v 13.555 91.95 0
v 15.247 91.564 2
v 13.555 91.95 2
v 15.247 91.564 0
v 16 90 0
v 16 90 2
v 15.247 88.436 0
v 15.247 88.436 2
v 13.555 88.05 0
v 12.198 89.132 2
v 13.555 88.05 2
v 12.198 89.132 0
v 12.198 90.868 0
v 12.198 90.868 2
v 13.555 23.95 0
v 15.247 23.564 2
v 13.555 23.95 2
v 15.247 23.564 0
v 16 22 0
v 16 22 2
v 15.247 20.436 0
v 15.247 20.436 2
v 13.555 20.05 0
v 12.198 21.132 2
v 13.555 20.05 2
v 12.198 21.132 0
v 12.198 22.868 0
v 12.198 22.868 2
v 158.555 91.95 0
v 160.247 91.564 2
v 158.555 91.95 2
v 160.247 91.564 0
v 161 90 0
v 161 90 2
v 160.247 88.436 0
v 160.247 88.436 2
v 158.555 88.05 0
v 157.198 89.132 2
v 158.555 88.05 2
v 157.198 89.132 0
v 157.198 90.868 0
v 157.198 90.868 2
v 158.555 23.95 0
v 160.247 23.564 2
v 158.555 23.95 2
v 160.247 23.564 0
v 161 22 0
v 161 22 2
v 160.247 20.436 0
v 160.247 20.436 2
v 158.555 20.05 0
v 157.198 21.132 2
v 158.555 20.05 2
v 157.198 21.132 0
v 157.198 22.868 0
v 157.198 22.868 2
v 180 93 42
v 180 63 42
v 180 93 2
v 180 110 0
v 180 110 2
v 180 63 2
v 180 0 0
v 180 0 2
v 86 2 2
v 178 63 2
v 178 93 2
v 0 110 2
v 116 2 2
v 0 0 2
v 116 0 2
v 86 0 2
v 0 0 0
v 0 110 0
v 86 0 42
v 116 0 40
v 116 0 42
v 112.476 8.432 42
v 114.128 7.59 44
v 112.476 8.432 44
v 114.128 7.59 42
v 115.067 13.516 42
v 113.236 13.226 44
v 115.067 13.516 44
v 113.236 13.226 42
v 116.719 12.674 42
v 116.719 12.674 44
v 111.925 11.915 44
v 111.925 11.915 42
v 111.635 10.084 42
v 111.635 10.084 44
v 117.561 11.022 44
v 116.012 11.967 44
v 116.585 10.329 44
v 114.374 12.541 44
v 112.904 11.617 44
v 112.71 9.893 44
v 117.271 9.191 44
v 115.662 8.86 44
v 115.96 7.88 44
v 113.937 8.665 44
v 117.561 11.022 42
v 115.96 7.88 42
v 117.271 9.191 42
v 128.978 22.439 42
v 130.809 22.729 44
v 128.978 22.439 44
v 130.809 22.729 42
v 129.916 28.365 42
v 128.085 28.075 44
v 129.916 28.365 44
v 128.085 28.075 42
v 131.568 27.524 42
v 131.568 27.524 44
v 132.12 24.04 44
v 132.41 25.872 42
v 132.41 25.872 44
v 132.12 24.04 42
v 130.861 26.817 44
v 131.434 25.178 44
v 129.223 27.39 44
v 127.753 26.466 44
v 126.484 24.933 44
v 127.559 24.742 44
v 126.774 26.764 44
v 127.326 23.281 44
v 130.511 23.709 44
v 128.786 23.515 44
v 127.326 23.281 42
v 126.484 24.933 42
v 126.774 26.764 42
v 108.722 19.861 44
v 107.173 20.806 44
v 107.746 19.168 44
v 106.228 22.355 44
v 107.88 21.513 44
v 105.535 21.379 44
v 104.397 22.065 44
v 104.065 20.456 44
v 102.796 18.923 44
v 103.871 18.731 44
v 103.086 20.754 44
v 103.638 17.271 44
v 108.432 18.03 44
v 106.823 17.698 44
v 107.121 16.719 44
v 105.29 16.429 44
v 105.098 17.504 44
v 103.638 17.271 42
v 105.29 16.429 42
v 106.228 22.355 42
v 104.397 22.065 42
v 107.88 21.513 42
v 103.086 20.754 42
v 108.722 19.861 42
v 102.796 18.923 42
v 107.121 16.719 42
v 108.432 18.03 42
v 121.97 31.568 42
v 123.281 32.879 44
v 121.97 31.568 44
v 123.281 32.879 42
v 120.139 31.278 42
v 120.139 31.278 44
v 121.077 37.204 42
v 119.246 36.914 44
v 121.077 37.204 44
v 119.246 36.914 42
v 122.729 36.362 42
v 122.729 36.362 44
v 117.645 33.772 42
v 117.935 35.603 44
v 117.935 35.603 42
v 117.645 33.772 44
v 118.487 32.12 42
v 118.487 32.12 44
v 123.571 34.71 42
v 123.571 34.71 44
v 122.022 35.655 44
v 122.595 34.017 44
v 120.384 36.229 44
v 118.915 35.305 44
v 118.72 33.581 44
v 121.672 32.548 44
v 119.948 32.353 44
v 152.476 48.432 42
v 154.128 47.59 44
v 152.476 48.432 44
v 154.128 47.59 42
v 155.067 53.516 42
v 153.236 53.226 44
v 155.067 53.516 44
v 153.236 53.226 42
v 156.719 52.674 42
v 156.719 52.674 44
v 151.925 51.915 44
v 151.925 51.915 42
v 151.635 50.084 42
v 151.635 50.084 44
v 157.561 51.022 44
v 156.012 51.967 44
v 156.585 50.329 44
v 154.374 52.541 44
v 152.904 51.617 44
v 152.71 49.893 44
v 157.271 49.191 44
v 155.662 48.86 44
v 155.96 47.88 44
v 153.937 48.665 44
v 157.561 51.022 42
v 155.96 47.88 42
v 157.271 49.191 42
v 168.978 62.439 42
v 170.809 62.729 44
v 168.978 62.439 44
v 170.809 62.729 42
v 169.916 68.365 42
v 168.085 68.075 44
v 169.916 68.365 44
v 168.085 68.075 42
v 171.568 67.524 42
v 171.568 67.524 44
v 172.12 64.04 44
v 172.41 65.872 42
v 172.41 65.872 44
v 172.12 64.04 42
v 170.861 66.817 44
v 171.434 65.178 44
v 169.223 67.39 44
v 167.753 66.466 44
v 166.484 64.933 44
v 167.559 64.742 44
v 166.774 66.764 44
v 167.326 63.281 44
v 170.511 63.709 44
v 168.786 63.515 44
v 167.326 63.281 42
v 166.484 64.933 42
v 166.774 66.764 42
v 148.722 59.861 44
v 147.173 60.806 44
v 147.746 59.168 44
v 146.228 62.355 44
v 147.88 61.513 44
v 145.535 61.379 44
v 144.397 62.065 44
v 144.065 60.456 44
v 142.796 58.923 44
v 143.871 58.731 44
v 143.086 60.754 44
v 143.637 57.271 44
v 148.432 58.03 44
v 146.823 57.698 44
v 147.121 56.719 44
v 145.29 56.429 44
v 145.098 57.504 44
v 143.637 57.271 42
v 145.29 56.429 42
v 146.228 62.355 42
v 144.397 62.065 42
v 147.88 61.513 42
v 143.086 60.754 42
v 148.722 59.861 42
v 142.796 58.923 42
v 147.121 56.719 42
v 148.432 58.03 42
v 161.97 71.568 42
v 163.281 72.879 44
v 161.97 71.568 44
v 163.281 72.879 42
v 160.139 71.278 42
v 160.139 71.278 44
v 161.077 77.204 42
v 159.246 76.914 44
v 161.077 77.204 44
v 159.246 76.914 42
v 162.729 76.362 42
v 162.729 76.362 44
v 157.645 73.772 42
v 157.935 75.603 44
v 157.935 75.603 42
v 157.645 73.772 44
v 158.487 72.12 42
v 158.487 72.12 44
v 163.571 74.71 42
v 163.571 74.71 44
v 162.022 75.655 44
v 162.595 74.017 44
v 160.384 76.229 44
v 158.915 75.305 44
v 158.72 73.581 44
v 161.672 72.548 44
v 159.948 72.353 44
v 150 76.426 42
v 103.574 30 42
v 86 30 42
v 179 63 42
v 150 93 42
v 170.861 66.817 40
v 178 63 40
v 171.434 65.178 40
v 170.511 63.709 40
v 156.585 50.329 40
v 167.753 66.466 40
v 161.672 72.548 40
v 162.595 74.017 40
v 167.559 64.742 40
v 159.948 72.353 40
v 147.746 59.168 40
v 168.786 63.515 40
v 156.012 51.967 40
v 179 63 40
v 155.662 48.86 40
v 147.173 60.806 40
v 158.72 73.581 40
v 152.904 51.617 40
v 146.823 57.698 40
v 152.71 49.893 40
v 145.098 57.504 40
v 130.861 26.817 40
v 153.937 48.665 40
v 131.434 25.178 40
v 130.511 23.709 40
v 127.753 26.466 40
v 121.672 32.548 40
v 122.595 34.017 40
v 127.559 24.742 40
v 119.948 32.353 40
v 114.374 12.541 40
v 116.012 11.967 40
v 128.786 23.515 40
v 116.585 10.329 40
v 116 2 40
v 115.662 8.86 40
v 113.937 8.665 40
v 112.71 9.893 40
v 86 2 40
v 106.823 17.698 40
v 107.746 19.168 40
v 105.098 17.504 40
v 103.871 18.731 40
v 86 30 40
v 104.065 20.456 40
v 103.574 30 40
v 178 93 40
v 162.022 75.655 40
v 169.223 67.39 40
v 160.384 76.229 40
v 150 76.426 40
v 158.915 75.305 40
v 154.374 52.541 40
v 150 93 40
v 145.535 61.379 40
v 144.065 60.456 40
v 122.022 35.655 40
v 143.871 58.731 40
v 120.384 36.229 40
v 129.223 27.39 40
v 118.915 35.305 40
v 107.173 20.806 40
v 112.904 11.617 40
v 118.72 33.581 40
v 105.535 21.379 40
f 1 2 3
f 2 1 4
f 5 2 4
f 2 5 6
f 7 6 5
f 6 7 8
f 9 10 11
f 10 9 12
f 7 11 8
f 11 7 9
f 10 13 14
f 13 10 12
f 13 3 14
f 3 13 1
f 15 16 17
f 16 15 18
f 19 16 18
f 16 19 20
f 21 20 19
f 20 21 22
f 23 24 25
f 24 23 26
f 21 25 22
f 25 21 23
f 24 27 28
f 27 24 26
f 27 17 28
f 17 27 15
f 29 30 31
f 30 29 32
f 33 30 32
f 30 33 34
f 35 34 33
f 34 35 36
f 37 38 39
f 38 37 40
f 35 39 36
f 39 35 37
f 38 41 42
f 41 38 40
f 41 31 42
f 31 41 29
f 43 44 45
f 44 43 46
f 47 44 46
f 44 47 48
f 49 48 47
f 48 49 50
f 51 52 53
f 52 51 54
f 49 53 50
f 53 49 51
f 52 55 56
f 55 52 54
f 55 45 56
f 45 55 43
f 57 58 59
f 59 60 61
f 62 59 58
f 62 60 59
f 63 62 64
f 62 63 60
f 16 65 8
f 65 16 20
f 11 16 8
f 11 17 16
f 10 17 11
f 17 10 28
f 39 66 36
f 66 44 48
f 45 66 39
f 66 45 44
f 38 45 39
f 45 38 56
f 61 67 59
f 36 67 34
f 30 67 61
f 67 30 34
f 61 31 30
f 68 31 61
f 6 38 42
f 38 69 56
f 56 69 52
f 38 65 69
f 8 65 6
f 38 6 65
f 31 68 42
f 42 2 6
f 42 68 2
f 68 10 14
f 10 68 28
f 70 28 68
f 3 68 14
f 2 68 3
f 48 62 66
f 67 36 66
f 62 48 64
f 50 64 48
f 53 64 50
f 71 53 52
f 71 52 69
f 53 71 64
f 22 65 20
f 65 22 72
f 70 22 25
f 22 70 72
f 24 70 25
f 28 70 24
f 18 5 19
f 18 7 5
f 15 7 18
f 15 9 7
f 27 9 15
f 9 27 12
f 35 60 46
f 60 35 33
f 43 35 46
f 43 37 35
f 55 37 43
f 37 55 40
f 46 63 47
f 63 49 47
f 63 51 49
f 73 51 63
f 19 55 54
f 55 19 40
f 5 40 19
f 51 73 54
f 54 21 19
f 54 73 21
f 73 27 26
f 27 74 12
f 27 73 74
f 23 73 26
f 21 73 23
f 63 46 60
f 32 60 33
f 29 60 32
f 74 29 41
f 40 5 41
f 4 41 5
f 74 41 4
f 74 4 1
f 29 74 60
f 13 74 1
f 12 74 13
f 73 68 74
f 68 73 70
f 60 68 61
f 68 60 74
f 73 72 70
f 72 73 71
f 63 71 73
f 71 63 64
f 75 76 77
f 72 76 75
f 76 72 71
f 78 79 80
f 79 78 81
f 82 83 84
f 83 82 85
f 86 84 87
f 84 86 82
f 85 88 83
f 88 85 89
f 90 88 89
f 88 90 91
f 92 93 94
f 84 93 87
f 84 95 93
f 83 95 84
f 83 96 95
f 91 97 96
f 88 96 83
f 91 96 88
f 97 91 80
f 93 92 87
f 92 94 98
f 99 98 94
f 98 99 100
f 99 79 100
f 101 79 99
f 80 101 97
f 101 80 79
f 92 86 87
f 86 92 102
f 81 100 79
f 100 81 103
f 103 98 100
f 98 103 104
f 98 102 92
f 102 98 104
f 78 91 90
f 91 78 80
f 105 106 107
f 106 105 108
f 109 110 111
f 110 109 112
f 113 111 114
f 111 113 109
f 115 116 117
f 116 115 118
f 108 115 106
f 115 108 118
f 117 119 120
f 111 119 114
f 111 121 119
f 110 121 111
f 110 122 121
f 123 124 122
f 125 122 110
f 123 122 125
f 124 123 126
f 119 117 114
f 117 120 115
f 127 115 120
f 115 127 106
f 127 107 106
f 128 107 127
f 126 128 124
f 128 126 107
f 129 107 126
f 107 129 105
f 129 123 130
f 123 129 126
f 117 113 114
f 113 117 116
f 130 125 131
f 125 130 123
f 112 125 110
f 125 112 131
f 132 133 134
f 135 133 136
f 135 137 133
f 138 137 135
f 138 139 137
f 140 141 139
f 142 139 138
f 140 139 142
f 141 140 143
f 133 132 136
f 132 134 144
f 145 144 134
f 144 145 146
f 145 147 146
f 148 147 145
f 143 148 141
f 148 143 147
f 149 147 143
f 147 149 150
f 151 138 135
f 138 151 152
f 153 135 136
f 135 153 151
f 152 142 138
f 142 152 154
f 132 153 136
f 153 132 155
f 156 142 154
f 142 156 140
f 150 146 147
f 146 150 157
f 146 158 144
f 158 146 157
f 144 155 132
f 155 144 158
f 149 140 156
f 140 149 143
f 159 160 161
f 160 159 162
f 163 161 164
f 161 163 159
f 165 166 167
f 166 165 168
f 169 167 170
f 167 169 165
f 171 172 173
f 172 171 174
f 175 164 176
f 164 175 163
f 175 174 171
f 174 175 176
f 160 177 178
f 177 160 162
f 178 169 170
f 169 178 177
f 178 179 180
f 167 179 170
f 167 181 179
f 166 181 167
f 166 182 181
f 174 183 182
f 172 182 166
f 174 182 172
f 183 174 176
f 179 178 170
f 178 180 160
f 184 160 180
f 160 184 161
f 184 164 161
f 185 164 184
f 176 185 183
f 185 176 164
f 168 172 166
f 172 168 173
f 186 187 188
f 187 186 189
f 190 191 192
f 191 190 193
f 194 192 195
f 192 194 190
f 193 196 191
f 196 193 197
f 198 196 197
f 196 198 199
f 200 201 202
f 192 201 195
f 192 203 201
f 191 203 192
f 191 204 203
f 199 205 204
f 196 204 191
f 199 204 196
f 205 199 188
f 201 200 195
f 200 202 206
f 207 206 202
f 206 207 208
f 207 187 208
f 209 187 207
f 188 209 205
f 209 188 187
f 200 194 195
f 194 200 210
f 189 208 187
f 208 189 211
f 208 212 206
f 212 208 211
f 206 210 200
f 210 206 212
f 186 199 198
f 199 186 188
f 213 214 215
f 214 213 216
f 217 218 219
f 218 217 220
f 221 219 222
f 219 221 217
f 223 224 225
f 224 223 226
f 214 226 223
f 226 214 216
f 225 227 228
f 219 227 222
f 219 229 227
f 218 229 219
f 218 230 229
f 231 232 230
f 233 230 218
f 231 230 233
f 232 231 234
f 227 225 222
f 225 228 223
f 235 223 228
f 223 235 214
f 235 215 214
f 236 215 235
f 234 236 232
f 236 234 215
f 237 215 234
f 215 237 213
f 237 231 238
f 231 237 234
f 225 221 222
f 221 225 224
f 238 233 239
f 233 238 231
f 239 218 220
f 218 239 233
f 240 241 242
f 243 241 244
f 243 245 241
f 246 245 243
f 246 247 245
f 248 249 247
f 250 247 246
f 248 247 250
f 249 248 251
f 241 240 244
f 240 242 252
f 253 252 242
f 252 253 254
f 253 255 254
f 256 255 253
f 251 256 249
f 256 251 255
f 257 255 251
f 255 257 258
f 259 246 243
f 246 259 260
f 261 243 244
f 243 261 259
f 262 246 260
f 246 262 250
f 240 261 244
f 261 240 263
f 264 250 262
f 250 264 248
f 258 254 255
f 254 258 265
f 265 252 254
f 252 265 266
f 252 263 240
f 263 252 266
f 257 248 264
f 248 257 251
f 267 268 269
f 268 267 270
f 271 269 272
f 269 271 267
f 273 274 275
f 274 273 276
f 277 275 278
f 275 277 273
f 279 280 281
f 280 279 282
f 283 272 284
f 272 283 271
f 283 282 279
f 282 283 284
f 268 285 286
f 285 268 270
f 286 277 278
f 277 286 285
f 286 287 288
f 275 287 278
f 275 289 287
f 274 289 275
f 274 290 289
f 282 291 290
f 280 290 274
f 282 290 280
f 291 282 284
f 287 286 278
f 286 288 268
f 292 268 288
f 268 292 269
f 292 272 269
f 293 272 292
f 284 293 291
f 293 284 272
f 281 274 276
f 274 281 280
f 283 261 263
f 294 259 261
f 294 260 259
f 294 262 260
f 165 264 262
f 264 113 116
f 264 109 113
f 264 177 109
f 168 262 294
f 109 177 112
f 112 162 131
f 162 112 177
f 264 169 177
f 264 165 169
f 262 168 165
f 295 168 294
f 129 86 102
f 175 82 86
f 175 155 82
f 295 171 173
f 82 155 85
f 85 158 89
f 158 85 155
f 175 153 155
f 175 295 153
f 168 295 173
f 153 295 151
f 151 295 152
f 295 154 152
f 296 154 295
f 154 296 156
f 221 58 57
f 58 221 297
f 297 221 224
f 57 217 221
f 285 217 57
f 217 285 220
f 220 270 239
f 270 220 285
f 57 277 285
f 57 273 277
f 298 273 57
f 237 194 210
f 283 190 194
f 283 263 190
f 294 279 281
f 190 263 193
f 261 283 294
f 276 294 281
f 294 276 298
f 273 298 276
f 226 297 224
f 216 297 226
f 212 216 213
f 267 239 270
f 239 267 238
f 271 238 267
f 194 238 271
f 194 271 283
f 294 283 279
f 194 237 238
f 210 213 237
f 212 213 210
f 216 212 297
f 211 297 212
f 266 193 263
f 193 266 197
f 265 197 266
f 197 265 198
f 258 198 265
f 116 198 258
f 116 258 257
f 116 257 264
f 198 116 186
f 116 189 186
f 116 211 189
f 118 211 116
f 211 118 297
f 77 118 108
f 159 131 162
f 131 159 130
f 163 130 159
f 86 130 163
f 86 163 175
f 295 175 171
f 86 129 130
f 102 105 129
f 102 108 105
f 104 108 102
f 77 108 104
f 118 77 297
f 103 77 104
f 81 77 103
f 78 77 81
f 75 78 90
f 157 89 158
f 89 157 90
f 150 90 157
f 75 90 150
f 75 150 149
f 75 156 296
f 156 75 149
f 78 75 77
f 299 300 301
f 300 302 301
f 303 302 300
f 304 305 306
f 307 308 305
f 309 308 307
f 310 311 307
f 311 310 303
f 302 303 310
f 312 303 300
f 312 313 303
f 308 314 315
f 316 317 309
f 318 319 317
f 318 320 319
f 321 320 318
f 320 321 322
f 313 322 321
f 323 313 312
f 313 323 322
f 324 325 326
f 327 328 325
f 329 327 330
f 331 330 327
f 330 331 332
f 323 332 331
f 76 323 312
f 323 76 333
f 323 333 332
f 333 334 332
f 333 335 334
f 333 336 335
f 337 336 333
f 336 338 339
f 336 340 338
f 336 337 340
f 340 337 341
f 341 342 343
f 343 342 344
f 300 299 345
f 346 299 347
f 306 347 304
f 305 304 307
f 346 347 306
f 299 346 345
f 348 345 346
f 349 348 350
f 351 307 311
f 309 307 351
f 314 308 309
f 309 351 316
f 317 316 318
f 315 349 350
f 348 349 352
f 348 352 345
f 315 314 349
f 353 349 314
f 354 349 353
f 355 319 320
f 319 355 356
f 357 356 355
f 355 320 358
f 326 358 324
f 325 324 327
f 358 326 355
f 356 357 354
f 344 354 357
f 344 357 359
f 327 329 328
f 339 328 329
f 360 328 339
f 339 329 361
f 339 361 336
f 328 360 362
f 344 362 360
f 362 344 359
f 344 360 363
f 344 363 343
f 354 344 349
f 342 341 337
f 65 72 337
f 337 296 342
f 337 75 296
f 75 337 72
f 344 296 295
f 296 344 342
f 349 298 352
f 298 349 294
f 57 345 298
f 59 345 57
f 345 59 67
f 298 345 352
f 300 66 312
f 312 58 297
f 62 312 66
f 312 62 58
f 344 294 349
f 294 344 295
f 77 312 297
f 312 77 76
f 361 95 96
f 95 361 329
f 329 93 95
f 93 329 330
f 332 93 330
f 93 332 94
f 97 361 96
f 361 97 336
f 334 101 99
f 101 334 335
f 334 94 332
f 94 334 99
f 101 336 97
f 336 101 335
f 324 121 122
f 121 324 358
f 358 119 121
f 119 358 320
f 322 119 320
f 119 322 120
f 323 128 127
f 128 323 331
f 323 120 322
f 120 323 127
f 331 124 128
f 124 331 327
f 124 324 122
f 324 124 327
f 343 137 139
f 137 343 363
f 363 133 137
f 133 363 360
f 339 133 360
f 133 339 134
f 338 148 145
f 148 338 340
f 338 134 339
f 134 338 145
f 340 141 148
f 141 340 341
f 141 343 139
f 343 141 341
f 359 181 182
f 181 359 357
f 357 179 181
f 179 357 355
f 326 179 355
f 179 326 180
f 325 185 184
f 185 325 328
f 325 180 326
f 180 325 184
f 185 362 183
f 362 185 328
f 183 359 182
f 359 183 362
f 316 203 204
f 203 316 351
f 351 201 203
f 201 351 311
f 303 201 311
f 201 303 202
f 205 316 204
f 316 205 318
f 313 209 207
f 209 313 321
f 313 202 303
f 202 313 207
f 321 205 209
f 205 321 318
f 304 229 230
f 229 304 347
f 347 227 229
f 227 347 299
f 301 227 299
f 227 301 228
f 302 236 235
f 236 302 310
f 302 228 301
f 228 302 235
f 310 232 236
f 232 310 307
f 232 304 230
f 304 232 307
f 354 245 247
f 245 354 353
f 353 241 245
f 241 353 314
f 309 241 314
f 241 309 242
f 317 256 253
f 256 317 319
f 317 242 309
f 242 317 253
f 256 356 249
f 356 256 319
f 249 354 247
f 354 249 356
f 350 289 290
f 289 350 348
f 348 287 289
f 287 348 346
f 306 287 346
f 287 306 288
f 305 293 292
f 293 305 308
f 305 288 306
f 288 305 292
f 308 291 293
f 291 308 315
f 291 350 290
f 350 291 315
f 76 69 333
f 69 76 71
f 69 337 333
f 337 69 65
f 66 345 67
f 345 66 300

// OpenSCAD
// file: helpers.scad
module standoff(x, y, z, h, r){
    translate([x, y, z])
        cylinder(h, r=r);
}


cam_dim = [25, 23.862]; // Camera dimensions
// Camera mounting holes relative to camera center
_cam_mount_bl = [(-cam_dim[0]/2)+2, (-cam_dim[1]/2)+2];
_cam_mount_tl = [(-cam_dim[0]/2)+2, 14.5-(cam_dim[1]/2)];
_cam_mount_br = [(cam_dim[0]/2)-2, (-cam_dim[1]/2)+2];
_cam_mount_tr = [(cam_dim[0]/2)-2, 14.5-(cam_dim[1]/2)];
module camera_standoffs(cam_x, cam_y, z, h, r){
    standoff(
        cam_x + _cam_mount_bl[0], 
        cam_y + _cam_mount_bl[1],
        z,
        h,
        r
    );
    standoff(
        cam_x + _cam_mount_br[0], 
        cam_y + _cam_mount_br[1],
        z,
        h,
        r
    );
    standoff(
        cam_x + _cam_mount_tl[0], 
        cam_y + _cam_mount_tl[1],
        z,
        h,
        r
    );
    standoff(
        cam_x + _cam_mount_tr[0], 
        cam_y + _cam_mount_tr[1],
        z,
        h,
        r
    );
}

module field_of_view(angle_x, angle_y, low, high){
    x = 2 * low * tan(angle_x/2);
    y = 2 * low * tan(angle_y/2);
    s = high / low;
    
    translate([0,0,low]) linear_extrude(
        height=high-low, 
//        v=[0,0,1], 
        center=false,
        scale=s
    ) scale([x,y]) circle(1, $fn=20);
}


cam_sensor = [0, 14.4 - (cam_dim[1]/2)]; // Camera sensor position, relative to camera center

module camera_and_mount(standoff, show_camera=false)
{
    if(show_camera)
    {
        translate([
            -cam_dim[0]/2, 
            -cam_dim[1]/2-cam_sensor[1], 
            standoff
        ])
        rotate([180, 0, 90])
            color("green") import("Camera_module_3_std_model_simple.stl");
    };
    difference()
    {
        camera_standoffs(0, -cam_sensor[1], 0, standoff, 3);
        camera_standoffs(0, -cam_sensor[1], -0.1, standoff+0.2, 1.5);
    };
}


module camera_and_mount_diff(standoff)
{
    camera_standoffs(0, -cam_sensor[1], -50-standoff/2, 100+standoff, 1.5);
    translate([0, 0, standoff+8])    
    field_of_view(
        66, 41,
        0.1, 50
    );
}


overlap = 0.001; // Overlap for joining parts

material_thickness = 3; // Smallest dimension of printed parts
pcb_standoff = 1; // Spacing underneath main PCB
cam_standoff = 3; // Spacing underneath camera PCBs

tof_dim = [22.86, 12.7]; // Time-of-flight sensor breakout dimensions
pcb_dim = [90, 70]; // PCB x-y size
pcb_mount_border = 10; // Material space around PCB
// PCB mounting holes x-y pos relative to PCB origin
pcb_mount_bl = [4.064, 3.556];
pcb_mount_tl = [4.064, pcb_dim[1]-3.5567];
pcb_mount_br = [pcb_dim[0]-4.572, 3.556];
pcb_mount_tr = [pcb_dim[0]-4.472, pcb_dim[1]-3.556];
pcb_mount_d = 2.5; // PCB mount hole diameter


module main_board(standoff, show_electronics=false)
{

    translate([- 33 - pcb_mount_border - tof_dim[0]/2, 
                - tof_dim[1] - 3.302 - pcb_mount_border + tof_dim[1]/2, 
                0]) union() // Shift entire assembly so sensor is at origin in x-y plane
    {
        if(show_electronics)
        {
            // ToF sensor, aligned to holes on carrier PCB, with mounting height of 8.51mm (female header pin insulation) + 2.5mm (male header pin insulation)
            translate([
                33 + pcb_mount_border, 
                tof_dim[1] + 3.302 + pcb_mount_border, 
                8.51 + 2.5 + standoff]
            ) 
            rotate([0, 0, -90])
                color("green") import("vl53l8cx-carrier-model.stl");
           
            
            // PCB model, without RPi (smaller height than    other components, so can ommit)
            translate([
                pcb_mount_border, 
                pcb_mount_border, 
                standoff
            ])
                color("green") import("../cpu_carrier/cpu_carrier.stl");
        };
        
        // Mounting
        difference(){
            union(){
                // Standoffs to provide space under PCB
                standoff(
                    pcb_mount_bl[0] + pcb_mount_border, 
                    pcb_mount_bl[1] + pcb_mount_border, 
                    0,
                    standoff,
                    4
                );
                standoff(
                    pcb_mount_tl[0] + pcb_mount_border, 
                    pcb_mount_tl[1] + pcb_mount_border, 
                    0,
                    standoff,
                    4
                );
                standoff(
                    pcb_mount_br[0] + pcb_mount_border, 
                    pcb_mount_br[1] + pcb_mount_border, 
                    0,
                    standoff,
                    4
                );
                standoff(
                    pcb_mount_tr[0] + pcb_mount_border, 
                    pcb_mount_tr[1] + pcb_mount_border, 
                    0 ,
                    standoff,
                    4
                );
            };
            // Holes
            union(){
                standoff(
                    pcb_mount_bl[0] + pcb_mount_border, 
                    pcb_mount_bl[1] + pcb_mount_border, 
                    -overlap,
                    standoff+2*overlap,
                    1.5
                );
                standoff(
                    pcb_mount_tl[0] + pcb_mount_border, 
                    pcb_mount_tl[1] + pcb_mount_border, 
                    -overlap,
                    standoff+2*overlap,
                    1.5
                );
                standoff(
                    pcb_mount_br[0] + pcb_mount_border, 
                    pcb_mount_br[1] + pcb_mount_border, 
                    -overlap,
                    standoff+2*overlap,
                    1.5
                );
                standoff(
                    pcb_mount_tr[0] + pcb_mount_border, 
                    pcb_mount_tr[1] + pcb_mount_border, 
                    -overlap,
                    standoff+2*overlap,
                    1.5
                );
            }
        };
    };
}


module main_board_diff(standoff)
{

    translate([0, 0, 8.51 + 2.5 + standoff + 3]) field_of_view(
        60, 60,
        0.1, 50
    );
    translate([- 33 - pcb_mount_border - tof_dim[0]/2, 
                - tof_dim[1] - 3.302 - pcb_mount_border + tof_dim[1]/2, 
                0]) 
    union() // Shift entire assembly so sensor is at origin in x-y plane
    {
        standoff(
            pcb_mount_bl[0] + pcb_mount_border, 
            pcb_mount_bl[1] + pcb_mount_border, 
            -50-standoff/2,
            100+standoff,
            1.5
        );
        standoff(
            pcb_mount_tl[0] + pcb_mount_border, 
            pcb_mount_tl[1] + pcb_mount_border, 
            -50-standoff/2,
            100+standoff,
            1.5
        );
        standoff(
            pcb_mount_br[0] + pcb_mount_border, 
            pcb_mount_br[1] + pcb_mount_border, 
            -50-standoff/2,
            100+standoff,
            1.5
        );
        standoff(
            pcb_mount_tr[0] + pcb_mount_border, 
            pcb_mount_tr[1] + pcb_mount_border, 
            -50-standoff/2,
            100+standoff,
            1.5
        );
    };
}
// main file
include <helpers.scad>

// Base and mount holes
difference(){
    cube([180, 110, 2]);
    union(){
        translate([14, 90, -0.5])
            cylinder(3, r=2);
        translate([14, 22, -0.5])
            cylinder(3, r=2);
        translate([159, 90, -0.5])
            cylinder(3, r=2);
        translate([159, 22, -0.5])
            cylinder(3, r=2);
    };
};

// Camera platform
union(){
    difference(){
        union(){
            // Platform
            translate([86, 0, 40]) cube([30, 30, 2]);
            translate([150, 63, 40]) cube([30, 30, 2]);
            translate([116, 0, 40]) rotate([0, 0, 45])
                cube([90, 30, 2]);
            // Camera standoffs
            translate([115, 25, 41]) rotate([0, 0, 45])
                camera_standoffs(0, 0, 0, 3, 3);
            translate([155, 65, 41]) rotate([0, 0, 45])
                camera_standoffs(0, 0, 0, 3, 3);
        };
        union(){
            translate([115, 25, 41]) rotate([0, 0, 45])
            translate([0,0,-3]) camera_standoffs(0, 0, 0, 7, 2);
            translate([155, 65, 41]) rotate([0, 0, 45])
            translate([0,0,-3]) camera_standoffs(0, 0, 0, 7, 2);
        }
    };
};

// Vertical connectors
translate([86, 0, 0]) cube([30, 2, 42]);
translate([178, 63, 0]) cube([2, 30, 42]);
